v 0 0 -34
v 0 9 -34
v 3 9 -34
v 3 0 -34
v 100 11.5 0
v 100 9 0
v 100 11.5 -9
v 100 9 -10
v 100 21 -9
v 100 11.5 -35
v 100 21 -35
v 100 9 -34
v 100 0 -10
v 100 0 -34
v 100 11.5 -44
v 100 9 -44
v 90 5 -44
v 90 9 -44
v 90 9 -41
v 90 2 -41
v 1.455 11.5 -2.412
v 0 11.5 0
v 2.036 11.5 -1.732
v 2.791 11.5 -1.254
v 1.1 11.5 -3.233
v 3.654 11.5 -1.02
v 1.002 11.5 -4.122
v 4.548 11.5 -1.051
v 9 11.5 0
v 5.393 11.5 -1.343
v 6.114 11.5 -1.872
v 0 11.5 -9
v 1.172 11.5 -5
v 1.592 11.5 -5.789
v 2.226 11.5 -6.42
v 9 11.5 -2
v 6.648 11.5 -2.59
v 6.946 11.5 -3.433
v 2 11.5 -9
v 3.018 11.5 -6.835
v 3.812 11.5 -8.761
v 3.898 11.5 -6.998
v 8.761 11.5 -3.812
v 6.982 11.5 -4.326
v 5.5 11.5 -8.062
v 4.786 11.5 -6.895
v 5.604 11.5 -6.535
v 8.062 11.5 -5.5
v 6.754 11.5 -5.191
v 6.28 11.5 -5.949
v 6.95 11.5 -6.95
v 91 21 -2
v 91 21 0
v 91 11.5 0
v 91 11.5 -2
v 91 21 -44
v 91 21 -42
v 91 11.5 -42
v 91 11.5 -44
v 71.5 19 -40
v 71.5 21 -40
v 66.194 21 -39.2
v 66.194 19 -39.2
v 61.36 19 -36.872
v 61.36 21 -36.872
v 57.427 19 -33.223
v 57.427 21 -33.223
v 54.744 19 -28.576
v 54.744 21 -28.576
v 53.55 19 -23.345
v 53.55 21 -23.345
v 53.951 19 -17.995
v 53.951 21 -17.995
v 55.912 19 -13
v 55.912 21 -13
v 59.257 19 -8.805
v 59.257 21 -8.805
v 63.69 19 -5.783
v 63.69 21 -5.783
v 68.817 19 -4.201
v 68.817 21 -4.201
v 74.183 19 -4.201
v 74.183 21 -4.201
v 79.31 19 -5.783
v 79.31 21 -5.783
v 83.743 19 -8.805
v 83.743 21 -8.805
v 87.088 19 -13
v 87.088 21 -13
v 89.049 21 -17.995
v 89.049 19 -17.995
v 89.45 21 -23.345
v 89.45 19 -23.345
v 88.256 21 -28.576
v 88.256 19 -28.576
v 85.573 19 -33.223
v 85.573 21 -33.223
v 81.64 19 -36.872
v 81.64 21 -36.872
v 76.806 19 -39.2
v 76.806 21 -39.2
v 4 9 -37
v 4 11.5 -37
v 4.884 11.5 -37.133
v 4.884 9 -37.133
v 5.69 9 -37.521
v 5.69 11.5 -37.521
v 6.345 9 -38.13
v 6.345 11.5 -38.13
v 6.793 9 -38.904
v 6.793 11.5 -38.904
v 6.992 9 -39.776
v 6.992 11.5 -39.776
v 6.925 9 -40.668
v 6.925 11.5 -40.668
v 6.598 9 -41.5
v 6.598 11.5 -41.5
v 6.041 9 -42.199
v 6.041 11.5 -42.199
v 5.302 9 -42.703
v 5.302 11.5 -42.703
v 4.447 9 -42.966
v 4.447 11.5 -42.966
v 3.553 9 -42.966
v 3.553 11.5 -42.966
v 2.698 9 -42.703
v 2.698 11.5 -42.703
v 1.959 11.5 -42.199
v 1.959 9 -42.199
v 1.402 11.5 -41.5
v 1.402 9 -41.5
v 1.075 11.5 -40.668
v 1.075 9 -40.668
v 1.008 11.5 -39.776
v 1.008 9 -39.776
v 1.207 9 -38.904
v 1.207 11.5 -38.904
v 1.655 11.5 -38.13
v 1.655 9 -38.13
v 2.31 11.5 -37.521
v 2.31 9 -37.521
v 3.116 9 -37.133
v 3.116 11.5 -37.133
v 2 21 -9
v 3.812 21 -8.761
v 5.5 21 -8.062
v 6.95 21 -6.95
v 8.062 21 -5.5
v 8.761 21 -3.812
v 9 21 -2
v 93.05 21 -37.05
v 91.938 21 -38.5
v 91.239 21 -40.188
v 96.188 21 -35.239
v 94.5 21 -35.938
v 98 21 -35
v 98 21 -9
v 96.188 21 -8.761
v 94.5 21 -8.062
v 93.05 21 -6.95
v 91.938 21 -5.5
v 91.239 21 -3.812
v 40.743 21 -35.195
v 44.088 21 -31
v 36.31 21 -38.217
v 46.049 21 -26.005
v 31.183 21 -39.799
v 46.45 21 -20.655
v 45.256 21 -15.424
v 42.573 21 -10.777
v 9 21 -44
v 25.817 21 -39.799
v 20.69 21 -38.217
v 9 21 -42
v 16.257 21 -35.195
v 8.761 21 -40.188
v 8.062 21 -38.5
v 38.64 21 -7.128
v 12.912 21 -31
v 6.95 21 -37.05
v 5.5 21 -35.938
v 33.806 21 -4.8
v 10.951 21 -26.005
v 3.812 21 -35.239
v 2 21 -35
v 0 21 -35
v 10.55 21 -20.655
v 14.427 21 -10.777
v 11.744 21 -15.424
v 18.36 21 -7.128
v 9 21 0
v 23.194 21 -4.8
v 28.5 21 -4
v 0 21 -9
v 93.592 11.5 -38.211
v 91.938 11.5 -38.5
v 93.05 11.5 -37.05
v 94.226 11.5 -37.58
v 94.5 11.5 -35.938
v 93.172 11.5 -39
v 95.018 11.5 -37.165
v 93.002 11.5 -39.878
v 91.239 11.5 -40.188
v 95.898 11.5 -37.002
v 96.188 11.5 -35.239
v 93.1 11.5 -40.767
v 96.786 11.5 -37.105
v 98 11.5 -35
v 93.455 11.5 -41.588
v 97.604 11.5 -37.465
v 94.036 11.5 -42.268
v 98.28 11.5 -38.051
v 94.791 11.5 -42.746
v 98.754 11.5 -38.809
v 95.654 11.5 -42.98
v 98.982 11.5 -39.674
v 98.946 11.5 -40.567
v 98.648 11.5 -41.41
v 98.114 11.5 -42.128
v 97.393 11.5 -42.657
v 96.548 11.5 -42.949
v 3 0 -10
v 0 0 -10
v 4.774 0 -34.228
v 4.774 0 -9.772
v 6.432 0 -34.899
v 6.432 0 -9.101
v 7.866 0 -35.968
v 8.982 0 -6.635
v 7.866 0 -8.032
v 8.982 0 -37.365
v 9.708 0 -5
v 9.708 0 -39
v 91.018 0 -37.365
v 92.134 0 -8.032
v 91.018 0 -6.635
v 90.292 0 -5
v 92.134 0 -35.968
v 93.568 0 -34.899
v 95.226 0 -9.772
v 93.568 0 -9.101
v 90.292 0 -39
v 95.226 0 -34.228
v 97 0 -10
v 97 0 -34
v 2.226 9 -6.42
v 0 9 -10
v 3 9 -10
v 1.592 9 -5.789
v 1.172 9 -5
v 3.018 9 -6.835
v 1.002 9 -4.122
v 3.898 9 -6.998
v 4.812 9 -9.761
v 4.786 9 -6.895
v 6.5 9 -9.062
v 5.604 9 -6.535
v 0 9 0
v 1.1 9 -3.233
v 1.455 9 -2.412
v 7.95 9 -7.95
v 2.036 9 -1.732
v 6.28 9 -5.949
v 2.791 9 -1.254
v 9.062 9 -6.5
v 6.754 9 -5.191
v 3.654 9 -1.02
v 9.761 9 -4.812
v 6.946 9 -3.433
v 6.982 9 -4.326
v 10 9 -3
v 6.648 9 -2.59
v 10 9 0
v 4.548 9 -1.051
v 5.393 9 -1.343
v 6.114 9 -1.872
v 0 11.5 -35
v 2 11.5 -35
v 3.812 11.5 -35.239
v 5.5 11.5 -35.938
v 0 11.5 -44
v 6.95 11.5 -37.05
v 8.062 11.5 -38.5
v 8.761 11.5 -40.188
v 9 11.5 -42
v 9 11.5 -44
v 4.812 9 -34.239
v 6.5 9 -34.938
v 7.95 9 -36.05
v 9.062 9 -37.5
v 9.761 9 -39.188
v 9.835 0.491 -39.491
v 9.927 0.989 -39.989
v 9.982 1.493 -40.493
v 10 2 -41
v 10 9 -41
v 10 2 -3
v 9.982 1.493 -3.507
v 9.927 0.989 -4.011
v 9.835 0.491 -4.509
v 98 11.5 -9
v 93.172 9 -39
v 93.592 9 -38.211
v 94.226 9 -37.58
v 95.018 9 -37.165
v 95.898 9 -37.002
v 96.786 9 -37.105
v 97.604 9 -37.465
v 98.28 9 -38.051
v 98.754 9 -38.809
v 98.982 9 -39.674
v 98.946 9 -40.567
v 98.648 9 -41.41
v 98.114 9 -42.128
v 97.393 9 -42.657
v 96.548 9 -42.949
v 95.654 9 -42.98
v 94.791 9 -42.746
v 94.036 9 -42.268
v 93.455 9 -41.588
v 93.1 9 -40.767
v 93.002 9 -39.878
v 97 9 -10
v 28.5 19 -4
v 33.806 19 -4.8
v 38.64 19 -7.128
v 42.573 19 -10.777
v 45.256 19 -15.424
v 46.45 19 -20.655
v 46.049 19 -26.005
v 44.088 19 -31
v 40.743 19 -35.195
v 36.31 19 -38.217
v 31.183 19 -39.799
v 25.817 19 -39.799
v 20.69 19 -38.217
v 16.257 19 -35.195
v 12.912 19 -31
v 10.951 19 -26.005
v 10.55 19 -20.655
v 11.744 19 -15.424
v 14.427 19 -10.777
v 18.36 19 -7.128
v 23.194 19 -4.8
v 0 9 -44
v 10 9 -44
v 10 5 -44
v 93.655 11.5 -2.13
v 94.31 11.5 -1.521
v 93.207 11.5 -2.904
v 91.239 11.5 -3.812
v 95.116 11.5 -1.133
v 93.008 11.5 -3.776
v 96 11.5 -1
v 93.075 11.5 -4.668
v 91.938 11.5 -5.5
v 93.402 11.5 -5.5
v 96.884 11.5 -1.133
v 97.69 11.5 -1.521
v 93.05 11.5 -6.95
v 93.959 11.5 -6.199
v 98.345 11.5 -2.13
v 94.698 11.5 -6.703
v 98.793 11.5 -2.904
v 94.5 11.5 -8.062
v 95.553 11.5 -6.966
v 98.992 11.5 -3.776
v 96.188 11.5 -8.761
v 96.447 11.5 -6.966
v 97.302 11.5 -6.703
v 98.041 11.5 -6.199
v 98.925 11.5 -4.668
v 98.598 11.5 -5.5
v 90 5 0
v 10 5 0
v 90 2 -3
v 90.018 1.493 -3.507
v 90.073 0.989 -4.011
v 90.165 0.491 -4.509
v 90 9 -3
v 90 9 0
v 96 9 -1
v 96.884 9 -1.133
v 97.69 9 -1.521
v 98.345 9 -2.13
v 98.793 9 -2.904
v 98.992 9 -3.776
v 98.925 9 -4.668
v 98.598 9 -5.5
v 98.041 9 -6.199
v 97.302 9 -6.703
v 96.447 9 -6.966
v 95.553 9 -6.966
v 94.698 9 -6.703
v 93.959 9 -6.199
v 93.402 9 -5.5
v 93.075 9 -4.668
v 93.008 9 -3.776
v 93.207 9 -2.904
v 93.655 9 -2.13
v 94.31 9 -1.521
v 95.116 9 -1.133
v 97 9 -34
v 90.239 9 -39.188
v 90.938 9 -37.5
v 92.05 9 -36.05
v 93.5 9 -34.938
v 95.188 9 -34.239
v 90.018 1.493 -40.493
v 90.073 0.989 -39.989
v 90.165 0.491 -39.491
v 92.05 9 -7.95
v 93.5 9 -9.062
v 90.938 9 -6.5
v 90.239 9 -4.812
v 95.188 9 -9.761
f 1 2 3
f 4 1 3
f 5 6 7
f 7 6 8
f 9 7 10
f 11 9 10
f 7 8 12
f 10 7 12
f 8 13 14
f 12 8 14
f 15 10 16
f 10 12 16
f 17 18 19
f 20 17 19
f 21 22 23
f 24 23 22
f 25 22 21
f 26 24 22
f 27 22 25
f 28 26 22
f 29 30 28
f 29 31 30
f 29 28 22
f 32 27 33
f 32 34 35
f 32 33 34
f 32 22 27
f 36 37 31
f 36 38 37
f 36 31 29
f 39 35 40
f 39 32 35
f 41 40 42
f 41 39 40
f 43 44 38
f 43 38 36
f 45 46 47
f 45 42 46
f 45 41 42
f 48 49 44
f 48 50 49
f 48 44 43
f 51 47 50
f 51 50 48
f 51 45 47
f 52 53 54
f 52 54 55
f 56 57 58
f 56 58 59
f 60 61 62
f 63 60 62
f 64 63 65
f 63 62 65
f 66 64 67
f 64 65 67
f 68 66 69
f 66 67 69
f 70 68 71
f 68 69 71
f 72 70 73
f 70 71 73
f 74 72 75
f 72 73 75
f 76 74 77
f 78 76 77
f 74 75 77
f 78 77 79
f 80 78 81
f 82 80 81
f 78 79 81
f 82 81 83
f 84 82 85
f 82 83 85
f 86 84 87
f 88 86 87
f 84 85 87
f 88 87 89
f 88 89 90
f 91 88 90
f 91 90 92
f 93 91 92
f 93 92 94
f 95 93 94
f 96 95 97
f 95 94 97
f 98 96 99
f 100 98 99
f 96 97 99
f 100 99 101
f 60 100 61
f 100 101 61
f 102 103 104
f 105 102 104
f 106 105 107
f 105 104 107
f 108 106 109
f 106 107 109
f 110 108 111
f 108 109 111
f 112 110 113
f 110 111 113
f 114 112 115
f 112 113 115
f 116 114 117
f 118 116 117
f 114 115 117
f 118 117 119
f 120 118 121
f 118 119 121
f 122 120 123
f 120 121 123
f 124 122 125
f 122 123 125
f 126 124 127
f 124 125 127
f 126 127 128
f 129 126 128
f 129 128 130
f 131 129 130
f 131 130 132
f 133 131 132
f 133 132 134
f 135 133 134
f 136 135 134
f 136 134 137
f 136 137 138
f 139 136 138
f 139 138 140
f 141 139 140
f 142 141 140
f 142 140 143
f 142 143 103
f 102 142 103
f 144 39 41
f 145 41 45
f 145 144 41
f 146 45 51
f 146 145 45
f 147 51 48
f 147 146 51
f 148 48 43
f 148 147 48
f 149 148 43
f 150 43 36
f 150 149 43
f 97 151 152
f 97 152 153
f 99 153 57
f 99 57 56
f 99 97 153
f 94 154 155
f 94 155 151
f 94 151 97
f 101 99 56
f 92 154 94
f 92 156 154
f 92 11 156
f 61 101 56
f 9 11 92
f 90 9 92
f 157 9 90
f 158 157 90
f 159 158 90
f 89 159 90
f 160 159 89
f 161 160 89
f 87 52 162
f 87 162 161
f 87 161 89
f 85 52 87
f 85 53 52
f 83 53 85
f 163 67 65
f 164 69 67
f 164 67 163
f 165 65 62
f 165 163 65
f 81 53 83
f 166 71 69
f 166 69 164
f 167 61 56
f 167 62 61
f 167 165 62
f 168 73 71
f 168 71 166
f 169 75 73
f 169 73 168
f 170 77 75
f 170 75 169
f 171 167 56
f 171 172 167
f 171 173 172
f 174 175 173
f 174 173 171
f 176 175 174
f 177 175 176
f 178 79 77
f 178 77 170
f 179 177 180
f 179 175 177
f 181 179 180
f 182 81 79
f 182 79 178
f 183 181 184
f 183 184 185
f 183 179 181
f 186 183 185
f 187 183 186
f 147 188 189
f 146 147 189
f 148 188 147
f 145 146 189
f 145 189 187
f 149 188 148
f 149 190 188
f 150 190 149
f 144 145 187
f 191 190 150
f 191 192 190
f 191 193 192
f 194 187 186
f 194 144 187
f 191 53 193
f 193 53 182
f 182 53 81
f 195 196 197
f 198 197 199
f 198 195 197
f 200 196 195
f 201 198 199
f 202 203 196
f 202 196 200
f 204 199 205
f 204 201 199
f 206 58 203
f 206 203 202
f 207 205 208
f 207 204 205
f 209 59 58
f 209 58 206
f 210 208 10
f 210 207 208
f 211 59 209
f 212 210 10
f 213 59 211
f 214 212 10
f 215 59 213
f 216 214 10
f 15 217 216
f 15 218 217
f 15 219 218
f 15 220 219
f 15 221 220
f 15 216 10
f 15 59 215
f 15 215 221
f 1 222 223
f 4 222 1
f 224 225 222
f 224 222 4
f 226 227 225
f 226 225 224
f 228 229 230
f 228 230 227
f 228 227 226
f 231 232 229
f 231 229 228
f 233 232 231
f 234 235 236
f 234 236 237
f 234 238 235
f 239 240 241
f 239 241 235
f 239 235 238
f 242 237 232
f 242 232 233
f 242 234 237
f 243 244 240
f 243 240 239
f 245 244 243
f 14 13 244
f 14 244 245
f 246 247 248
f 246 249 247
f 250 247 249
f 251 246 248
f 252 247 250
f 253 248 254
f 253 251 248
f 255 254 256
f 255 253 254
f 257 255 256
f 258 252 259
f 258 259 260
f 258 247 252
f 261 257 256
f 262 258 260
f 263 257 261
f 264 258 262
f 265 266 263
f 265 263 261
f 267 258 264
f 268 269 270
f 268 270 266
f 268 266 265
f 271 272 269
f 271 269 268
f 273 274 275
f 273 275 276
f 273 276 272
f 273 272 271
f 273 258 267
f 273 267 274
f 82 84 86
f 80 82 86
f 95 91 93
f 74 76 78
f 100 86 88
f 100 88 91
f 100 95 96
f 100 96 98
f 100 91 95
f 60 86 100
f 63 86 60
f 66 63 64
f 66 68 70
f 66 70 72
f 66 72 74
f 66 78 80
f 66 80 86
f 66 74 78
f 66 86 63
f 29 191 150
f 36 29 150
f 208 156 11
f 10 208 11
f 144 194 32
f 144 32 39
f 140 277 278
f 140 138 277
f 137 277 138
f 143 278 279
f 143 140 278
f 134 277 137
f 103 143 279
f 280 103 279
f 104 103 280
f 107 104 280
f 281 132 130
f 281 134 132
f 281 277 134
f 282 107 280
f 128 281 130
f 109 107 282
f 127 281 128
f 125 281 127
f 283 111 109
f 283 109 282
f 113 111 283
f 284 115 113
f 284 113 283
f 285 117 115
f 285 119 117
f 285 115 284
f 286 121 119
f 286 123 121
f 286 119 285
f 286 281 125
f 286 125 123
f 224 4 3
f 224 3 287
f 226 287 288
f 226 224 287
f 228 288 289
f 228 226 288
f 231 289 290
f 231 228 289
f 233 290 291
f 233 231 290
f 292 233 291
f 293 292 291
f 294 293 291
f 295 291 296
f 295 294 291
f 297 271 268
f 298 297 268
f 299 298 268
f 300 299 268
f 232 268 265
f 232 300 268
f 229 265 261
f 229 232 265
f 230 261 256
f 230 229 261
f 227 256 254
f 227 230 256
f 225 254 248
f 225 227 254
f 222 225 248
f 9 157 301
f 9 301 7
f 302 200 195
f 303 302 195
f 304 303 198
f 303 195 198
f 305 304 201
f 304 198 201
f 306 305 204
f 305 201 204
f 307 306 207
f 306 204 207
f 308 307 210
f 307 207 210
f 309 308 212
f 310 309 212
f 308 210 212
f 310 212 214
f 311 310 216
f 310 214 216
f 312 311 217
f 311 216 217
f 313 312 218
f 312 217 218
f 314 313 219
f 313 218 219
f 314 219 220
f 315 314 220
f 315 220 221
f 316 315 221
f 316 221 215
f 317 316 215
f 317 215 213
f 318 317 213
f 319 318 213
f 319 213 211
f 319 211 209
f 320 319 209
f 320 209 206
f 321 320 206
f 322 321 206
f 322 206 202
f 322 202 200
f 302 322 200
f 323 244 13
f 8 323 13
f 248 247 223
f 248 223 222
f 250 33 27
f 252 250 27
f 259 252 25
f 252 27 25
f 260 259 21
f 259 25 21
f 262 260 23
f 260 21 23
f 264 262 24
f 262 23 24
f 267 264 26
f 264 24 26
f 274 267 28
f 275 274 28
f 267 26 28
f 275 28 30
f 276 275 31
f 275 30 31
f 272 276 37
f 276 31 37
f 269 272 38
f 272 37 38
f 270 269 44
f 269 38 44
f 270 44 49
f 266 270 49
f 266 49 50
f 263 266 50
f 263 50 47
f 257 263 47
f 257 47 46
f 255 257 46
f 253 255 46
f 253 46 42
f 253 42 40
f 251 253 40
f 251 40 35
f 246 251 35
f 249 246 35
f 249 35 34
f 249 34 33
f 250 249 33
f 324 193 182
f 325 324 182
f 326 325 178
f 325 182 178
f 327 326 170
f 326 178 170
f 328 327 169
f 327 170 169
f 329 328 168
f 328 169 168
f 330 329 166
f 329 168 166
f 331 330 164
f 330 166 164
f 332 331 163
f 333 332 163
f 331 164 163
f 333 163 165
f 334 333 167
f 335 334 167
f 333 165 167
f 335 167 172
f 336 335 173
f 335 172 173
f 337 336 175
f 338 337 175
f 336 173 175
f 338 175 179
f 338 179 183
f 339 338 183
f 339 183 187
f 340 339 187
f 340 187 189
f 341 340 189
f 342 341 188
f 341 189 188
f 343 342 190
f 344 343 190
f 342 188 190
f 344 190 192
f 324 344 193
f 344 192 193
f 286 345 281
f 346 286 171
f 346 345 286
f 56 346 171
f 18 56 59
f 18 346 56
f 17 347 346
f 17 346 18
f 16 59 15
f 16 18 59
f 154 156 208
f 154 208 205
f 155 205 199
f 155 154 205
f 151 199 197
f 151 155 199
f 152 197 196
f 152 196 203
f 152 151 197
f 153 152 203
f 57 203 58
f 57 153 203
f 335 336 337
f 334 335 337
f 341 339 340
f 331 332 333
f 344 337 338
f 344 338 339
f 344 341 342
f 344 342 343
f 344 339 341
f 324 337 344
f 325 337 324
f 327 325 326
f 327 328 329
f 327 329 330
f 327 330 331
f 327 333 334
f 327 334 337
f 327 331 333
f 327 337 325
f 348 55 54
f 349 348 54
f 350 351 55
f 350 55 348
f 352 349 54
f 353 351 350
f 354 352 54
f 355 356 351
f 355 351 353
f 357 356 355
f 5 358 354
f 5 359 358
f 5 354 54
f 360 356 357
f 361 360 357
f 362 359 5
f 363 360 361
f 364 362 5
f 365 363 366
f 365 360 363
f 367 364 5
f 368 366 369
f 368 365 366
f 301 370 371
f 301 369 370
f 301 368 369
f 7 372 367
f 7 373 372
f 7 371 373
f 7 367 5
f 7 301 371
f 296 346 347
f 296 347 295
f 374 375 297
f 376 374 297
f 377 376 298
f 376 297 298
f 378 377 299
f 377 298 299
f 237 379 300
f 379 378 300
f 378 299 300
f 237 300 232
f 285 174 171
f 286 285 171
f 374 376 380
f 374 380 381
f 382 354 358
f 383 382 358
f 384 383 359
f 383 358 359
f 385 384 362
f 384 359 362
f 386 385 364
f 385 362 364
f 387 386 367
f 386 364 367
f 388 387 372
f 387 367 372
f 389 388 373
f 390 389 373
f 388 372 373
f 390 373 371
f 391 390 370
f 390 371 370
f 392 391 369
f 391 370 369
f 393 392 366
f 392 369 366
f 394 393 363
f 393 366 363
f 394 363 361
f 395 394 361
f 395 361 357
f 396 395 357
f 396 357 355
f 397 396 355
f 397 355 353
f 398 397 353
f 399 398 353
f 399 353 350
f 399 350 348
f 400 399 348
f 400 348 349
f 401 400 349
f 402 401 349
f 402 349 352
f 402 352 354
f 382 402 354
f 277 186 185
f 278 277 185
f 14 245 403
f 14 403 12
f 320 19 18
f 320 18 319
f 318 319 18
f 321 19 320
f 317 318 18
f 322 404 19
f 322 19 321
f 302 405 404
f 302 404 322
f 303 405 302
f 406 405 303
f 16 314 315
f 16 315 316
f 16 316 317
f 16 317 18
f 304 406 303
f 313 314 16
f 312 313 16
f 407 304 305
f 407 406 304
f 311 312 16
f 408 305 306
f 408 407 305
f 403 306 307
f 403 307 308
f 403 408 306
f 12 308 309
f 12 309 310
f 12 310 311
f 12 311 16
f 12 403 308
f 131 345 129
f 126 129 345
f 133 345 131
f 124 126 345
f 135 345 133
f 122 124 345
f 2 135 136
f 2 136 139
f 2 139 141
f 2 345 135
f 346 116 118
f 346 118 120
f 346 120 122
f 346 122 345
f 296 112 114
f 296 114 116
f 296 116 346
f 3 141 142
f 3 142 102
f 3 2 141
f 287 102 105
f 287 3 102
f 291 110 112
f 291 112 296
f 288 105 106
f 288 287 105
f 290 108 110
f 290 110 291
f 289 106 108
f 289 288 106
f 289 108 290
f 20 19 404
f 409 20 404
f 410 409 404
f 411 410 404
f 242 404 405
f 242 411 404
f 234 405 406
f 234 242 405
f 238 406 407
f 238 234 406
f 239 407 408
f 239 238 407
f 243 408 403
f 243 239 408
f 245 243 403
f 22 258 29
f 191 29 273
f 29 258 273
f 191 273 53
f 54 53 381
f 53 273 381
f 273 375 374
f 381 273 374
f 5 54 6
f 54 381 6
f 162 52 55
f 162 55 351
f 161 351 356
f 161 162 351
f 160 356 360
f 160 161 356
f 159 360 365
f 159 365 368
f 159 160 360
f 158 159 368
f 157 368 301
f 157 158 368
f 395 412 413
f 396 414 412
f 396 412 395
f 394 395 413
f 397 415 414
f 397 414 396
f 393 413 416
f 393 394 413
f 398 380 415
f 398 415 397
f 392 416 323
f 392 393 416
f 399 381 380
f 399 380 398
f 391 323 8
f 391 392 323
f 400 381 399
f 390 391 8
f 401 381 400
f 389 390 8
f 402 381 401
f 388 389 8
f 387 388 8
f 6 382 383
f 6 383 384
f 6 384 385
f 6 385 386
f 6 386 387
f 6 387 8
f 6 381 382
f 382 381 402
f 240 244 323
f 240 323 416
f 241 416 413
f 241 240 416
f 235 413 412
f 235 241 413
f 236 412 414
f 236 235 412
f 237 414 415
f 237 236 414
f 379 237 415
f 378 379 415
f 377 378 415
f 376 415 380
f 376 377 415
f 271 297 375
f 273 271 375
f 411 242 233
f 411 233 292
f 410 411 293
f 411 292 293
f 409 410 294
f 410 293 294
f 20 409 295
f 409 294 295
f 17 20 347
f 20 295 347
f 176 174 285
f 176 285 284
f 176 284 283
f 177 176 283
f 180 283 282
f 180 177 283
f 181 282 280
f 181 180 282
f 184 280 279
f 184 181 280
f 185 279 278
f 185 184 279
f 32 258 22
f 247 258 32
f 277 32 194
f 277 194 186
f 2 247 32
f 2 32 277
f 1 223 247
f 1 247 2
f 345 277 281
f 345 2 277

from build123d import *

# Parameters (mm, degrees)
SKETCH_1_W          = 100
SKETCH_1_H          = 44
EXTRUDE_1_DEPTH     = 21
CHAMFER_1_SIZE      = 5
SKETCH_2_R          = 3
CUT_EXTRUDE_1_DEPTH = 112.251966275
SKETCH_3_W          = 9
SKETCH_3_H          = 9
CUT_EXTRUDE_2_DEPTH = 9.5
SKETCH_4_R          = 18
CUT_EXTRUDE_3_DEPTH = 2
SKETCH_5_W          = 10
SKETCH_5_H          = 10
CUT_EXTRUDE_4_DEPTH = 9
FILLET_1_R          = 7


with BuildPart() as part:
    # 草图1 → 凸台-拉伸1 (new body)
    with BuildSketch(Plane(origin=(0, 0, 0), x_dir=(1, 0, 0), z_dir=(0, 1, 0))):
        with Locations((50, 22)):
            Rectangle(SKETCH_1_W, SKETCH_1_H)
    extrude(amount=EXTRUDE_1_DEPTH)

    # 倒角1
    chamfer_1_edges = [part.edges().sort_by_distance(p)[0] for p in [
        (50, 0, -44),
        (50, 0, 0),
    ]]
    chamfer(chamfer_1_edges, length=CHAMFER_1_SIZE)

    # 草图2 → 切除-拉伸1 (cut, through all)
    with BuildSketch(Plane(origin=(0, 21, 0), x_dir=(1, 0, 0), z_dir=(0, 1, 0))):
        with Locations(Location((96, 4, 0), (0, 0, 270))):
            Circle(SKETCH_2_R)
        with Locations(Location((4, 4, 0), (0, 0, 160.528779366))):
            Circle(SKETCH_2_R)
        with Locations(Location((4, 40, 0), (0, 0, 270))):
            Circle(SKETCH_2_R)
        with Locations(Location((96, 40, 0), (0, 0, 199.471220634))):
            Circle(SKETCH_2_R)
    extrude(amount=-CUT_EXTRUDE_1_DEPTH, mode=Mode.SUBTRACT)

    # 草图3 → 切除-拉伸2 (cut)
    with BuildSketch(Plane(origin=(0, 21, 0), x_dir=(1, 0, 0), z_dir=(0, 1, 0))):
        with Locations((95.5, 4.5)):
            Rectangle(SKETCH_3_W, SKETCH_3_H)
        with Locations((4.5, 4.5)):
            Rectangle(SKETCH_3_W, SKETCH_3_H)
        with Locations((95.5, 39.5)):
            Rectangle(SKETCH_3_W, SKETCH_3_H)
        with Locations((4.5, 39.5)):
            Rectangle(SKETCH_3_W, SKETCH_3_H)
    extrude(amount=-CUT_EXTRUDE_2_DEPTH, mode=Mode.SUBTRACT)

    # 草图4 → 切除-拉伸3 (cut)
    with BuildSketch(Plane(origin=(0, 21, 0), x_dir=(1, 0, 0), z_dir=(0, 1, 0))):
        with Locations(Location((28.5, 22, 0), (0, 0, 270))):
            Circle(SKETCH_4_R)
        with Locations(Location((71.5, 22, 0), (0, 0, 90))):
            Circle(SKETCH_4_R)
    extrude(amount=-CUT_EXTRUDE_3_DEPTH, mode=Mode.SUBTRACT)

    # 草图5 → 切除-拉伸4 (cut)
    with BuildSketch(Plane.XZ):
        with Locations((95, -39)):
            Rectangle(SKETCH_5_W, SKETCH_5_H)
        with Locations((95, -5)):
            Rectangle(SKETCH_5_W, SKETCH_5_H)
        with Locations((5, -5)):
            Rectangle(SKETCH_5_W, SKETCH_5_H)
        with Locations((5, -39)):
            Rectangle(SKETCH_5_W, SKETCH_5_H)
    extrude(amount=-CUT_EXTRUDE_4_DEPTH, mode=Mode.SUBTRACT)

    # 圆角1
    # the kernel refuses this fillet: 7 mm, written as the material it adds along each edge
    with BuildSketch(Plane(origin=(9, 21, -35), x_dir=(-1, 0, 0), z_dir=(0, -1, 0))) as fillet_1_piece_1:
        with BuildLine():
            CenterArc((FILLET_1_R, FILLET_1_R), FILLET_1_R, 180, 90)
            Line((0, FILLET_1_R), (0, 0))
            Line((0, 0), (FILLET_1_R, 0))
        make_face()
    extrude(amount=9.5)
    with BuildSketch(Plane(origin=(9, 21, -9), x_dir=(0, 0, 1), z_dir=(0, -1, 0))) as fillet_1_piece_2_section:
        with BuildLine():
            CenterArc((FILLET_1_R, FILLET_1_R), FILLET_1_R, 180, 90)
            Line((0, FILLET_1_R), (0, 0))
            Line((0, 0), (FILLET_1_R, 0))
        make_face()
    fillet_1_piece_2 = extrude(amount=27, mode=Mode.PRIVATE)
    fillet_1_piece_2 = split(fillet_1_piece_2, bisect_by=Plane(origin=(7.436424427, 9, -7.436424427), z_dir=(0, 1, 0)), keep=Keep.TOP, mode=Mode.PRIVATE)
    add(fillet_1_piece_2)
    with BuildSketch(Plane(origin=(10, 0, -10), x_dir=(0, 0, 1), z_dir=(0, 1, 0))) as fillet_1_piece_3_section:
        with BuildLine():
            CenterArc((FILLET_1_R, -FILLET_1_R), FILLET_1_R, 90, 90)
            Line((0, -FILLET_1_R), (0, 0))
            Line((0, 0), (FILLET_1_R, 0))
        make_face()
    fillet_1_piece_3 = extrude(amount=26.5, mode=Mode.PRIVATE)
    fillet_1_piece_3 = split(fillet_1_piece_3, bisect_by=Plane(origin=(9.565673238, 1.191688147, -3.808311853), z_dir=(0, 0.7071067811865476, -0.7071067811865476)), keep=Keep.TOP, mode=Mode.PRIVATE)
    fillet_1_piece_3 = split(fillet_1_piece_3, bisect_by=Plane(origin=(9.565673238, 21, -7.128953399), z_dir=(0, -1, 0)), keep=Keep.TOP, mode=Mode.PRIVATE)
    add(fillet_1_piece_3)
    with BuildSketch(Plane(origin=(10, 0, -34), x_dir=(-1, 0, 0), z_dir=(0, 1, 0))) as fillet_1_piece_4_section:
        with BuildLine():
            CenterArc((FILLET_1_R, -FILLET_1_R), FILLET_1_R, 90, 90)
            Line((0, -FILLET_1_R), (0, 0))
            Line((0, 0), (FILLET_1_R, 0))
        make_face()
    fillet_1_piece_4 = extrude(amount=26.5, mode=Mode.PRIVATE)
    fillet_1_piece_4 = split(fillet_1_piece_4, bisect_by=Plane(origin=(7.120179523, 21, -34.433198562), z_dir=(0, -1, 0)), keep=Keep.TOP, mode=Mode.PRIVATE)
    fillet_1_piece_4 = split(fillet_1_piece_4, bisect_by=Plane(origin=(7.120179523, -0.033400719, -38.966599281), z_dir=(0, 0.7071067811865476, 0.7071067811865476)), keep=Keep.TOP, mode=Mode.PRIVATE)
    add(fillet_1_piece_4)
    with BuildSketch(Plane(origin=(91, 21, -35), x_dir=(1, 0, 0), z_dir=(0, -1, 0)), Plane(origin=(91, 21, -9), x_dir=(0, 0, 1), z_dir=(0, -1, 0))) as fillet_1_piece_5:
        with BuildLine():
            CenterArc((FILLET_1_R, -FILLET_1_R), FILLET_1_R, 90, 90)
            Line((0, -FILLET_1_R), (0, 0))
            Line((0, 0), (FILLET_1_R, 0))
        make_face()
    extrude(amount=9.5)
    with BuildSketch(Plane(origin=(90, 0, -34), x_dir=(1, 0, 0), z_dir=(0, 1, 0))) as fillet_1_piece_6_section:
        with BuildLine():
            CenterArc((FILLET_1_R, FILLET_1_R), FILLET_1_R, 180, 90)
            Line((0, FILLET_1_R), (0, 0))
            Line((0, 0), (FILLET_1_R, 0))
        make_face()
    fillet_1_piece_6 = extrude(amount=26.5, mode=Mode.PRIVATE)
    fillet_1_piece_6 = split(fillet_1_piece_6, bisect_by=Plane(origin=(92.879820477, 21, -34.433198562), z_dir=(0, -1, 0)), keep=Keep.TOP, mode=Mode.PRIVATE)
    fillet_1_piece_6 = split(fillet_1_piece_6, bisect_by=Plane(origin=(92.879820477, -0.033400719, -38.966599281), z_dir=(0, 0.7071067811865476, 0.7071067811865476)), keep=Keep.TOP, mode=Mode.PRIVATE)
    add(fillet_1_piece_6)
    with BuildSketch(Plane(origin=(90, 0, -10), x_dir=(0, 0, 1), z_dir=(0, 1, 0))) as fillet_1_piece_7_section:
        with BuildLine():
            CenterArc((FILLET_1_R, FILLET_1_R), FILLET_1_R, 180, 90)
            Line((0, FILLET_1_R), (0, 0))
            Line((0, 0), (FILLET_1_R, 0))
        make_face()
    fillet_1_piece_7 = extrude(amount=26.5, mode=Mode.PRIVATE)
    fillet_1_piece_7 = split(fillet_1_piece_7, bisect_by=Plane(origin=(90.434326762, 1.191688147, -3.808311853), z_dir=(0, 0.7071067811865476, -0.7071067811865476)), keep=Keep.TOP, mode=Mode.PRIVATE)
    fillet_1_piece_7 = split(fillet_1_piece_7, bisect_by=Plane(origin=(90.434326762, 21, -7.128953399), z_dir=(0, -1, 0)), keep=Keep.TOP, mode=Mode.PRIVATE)
    add(fillet_1_piece_7)


solid = part.part
